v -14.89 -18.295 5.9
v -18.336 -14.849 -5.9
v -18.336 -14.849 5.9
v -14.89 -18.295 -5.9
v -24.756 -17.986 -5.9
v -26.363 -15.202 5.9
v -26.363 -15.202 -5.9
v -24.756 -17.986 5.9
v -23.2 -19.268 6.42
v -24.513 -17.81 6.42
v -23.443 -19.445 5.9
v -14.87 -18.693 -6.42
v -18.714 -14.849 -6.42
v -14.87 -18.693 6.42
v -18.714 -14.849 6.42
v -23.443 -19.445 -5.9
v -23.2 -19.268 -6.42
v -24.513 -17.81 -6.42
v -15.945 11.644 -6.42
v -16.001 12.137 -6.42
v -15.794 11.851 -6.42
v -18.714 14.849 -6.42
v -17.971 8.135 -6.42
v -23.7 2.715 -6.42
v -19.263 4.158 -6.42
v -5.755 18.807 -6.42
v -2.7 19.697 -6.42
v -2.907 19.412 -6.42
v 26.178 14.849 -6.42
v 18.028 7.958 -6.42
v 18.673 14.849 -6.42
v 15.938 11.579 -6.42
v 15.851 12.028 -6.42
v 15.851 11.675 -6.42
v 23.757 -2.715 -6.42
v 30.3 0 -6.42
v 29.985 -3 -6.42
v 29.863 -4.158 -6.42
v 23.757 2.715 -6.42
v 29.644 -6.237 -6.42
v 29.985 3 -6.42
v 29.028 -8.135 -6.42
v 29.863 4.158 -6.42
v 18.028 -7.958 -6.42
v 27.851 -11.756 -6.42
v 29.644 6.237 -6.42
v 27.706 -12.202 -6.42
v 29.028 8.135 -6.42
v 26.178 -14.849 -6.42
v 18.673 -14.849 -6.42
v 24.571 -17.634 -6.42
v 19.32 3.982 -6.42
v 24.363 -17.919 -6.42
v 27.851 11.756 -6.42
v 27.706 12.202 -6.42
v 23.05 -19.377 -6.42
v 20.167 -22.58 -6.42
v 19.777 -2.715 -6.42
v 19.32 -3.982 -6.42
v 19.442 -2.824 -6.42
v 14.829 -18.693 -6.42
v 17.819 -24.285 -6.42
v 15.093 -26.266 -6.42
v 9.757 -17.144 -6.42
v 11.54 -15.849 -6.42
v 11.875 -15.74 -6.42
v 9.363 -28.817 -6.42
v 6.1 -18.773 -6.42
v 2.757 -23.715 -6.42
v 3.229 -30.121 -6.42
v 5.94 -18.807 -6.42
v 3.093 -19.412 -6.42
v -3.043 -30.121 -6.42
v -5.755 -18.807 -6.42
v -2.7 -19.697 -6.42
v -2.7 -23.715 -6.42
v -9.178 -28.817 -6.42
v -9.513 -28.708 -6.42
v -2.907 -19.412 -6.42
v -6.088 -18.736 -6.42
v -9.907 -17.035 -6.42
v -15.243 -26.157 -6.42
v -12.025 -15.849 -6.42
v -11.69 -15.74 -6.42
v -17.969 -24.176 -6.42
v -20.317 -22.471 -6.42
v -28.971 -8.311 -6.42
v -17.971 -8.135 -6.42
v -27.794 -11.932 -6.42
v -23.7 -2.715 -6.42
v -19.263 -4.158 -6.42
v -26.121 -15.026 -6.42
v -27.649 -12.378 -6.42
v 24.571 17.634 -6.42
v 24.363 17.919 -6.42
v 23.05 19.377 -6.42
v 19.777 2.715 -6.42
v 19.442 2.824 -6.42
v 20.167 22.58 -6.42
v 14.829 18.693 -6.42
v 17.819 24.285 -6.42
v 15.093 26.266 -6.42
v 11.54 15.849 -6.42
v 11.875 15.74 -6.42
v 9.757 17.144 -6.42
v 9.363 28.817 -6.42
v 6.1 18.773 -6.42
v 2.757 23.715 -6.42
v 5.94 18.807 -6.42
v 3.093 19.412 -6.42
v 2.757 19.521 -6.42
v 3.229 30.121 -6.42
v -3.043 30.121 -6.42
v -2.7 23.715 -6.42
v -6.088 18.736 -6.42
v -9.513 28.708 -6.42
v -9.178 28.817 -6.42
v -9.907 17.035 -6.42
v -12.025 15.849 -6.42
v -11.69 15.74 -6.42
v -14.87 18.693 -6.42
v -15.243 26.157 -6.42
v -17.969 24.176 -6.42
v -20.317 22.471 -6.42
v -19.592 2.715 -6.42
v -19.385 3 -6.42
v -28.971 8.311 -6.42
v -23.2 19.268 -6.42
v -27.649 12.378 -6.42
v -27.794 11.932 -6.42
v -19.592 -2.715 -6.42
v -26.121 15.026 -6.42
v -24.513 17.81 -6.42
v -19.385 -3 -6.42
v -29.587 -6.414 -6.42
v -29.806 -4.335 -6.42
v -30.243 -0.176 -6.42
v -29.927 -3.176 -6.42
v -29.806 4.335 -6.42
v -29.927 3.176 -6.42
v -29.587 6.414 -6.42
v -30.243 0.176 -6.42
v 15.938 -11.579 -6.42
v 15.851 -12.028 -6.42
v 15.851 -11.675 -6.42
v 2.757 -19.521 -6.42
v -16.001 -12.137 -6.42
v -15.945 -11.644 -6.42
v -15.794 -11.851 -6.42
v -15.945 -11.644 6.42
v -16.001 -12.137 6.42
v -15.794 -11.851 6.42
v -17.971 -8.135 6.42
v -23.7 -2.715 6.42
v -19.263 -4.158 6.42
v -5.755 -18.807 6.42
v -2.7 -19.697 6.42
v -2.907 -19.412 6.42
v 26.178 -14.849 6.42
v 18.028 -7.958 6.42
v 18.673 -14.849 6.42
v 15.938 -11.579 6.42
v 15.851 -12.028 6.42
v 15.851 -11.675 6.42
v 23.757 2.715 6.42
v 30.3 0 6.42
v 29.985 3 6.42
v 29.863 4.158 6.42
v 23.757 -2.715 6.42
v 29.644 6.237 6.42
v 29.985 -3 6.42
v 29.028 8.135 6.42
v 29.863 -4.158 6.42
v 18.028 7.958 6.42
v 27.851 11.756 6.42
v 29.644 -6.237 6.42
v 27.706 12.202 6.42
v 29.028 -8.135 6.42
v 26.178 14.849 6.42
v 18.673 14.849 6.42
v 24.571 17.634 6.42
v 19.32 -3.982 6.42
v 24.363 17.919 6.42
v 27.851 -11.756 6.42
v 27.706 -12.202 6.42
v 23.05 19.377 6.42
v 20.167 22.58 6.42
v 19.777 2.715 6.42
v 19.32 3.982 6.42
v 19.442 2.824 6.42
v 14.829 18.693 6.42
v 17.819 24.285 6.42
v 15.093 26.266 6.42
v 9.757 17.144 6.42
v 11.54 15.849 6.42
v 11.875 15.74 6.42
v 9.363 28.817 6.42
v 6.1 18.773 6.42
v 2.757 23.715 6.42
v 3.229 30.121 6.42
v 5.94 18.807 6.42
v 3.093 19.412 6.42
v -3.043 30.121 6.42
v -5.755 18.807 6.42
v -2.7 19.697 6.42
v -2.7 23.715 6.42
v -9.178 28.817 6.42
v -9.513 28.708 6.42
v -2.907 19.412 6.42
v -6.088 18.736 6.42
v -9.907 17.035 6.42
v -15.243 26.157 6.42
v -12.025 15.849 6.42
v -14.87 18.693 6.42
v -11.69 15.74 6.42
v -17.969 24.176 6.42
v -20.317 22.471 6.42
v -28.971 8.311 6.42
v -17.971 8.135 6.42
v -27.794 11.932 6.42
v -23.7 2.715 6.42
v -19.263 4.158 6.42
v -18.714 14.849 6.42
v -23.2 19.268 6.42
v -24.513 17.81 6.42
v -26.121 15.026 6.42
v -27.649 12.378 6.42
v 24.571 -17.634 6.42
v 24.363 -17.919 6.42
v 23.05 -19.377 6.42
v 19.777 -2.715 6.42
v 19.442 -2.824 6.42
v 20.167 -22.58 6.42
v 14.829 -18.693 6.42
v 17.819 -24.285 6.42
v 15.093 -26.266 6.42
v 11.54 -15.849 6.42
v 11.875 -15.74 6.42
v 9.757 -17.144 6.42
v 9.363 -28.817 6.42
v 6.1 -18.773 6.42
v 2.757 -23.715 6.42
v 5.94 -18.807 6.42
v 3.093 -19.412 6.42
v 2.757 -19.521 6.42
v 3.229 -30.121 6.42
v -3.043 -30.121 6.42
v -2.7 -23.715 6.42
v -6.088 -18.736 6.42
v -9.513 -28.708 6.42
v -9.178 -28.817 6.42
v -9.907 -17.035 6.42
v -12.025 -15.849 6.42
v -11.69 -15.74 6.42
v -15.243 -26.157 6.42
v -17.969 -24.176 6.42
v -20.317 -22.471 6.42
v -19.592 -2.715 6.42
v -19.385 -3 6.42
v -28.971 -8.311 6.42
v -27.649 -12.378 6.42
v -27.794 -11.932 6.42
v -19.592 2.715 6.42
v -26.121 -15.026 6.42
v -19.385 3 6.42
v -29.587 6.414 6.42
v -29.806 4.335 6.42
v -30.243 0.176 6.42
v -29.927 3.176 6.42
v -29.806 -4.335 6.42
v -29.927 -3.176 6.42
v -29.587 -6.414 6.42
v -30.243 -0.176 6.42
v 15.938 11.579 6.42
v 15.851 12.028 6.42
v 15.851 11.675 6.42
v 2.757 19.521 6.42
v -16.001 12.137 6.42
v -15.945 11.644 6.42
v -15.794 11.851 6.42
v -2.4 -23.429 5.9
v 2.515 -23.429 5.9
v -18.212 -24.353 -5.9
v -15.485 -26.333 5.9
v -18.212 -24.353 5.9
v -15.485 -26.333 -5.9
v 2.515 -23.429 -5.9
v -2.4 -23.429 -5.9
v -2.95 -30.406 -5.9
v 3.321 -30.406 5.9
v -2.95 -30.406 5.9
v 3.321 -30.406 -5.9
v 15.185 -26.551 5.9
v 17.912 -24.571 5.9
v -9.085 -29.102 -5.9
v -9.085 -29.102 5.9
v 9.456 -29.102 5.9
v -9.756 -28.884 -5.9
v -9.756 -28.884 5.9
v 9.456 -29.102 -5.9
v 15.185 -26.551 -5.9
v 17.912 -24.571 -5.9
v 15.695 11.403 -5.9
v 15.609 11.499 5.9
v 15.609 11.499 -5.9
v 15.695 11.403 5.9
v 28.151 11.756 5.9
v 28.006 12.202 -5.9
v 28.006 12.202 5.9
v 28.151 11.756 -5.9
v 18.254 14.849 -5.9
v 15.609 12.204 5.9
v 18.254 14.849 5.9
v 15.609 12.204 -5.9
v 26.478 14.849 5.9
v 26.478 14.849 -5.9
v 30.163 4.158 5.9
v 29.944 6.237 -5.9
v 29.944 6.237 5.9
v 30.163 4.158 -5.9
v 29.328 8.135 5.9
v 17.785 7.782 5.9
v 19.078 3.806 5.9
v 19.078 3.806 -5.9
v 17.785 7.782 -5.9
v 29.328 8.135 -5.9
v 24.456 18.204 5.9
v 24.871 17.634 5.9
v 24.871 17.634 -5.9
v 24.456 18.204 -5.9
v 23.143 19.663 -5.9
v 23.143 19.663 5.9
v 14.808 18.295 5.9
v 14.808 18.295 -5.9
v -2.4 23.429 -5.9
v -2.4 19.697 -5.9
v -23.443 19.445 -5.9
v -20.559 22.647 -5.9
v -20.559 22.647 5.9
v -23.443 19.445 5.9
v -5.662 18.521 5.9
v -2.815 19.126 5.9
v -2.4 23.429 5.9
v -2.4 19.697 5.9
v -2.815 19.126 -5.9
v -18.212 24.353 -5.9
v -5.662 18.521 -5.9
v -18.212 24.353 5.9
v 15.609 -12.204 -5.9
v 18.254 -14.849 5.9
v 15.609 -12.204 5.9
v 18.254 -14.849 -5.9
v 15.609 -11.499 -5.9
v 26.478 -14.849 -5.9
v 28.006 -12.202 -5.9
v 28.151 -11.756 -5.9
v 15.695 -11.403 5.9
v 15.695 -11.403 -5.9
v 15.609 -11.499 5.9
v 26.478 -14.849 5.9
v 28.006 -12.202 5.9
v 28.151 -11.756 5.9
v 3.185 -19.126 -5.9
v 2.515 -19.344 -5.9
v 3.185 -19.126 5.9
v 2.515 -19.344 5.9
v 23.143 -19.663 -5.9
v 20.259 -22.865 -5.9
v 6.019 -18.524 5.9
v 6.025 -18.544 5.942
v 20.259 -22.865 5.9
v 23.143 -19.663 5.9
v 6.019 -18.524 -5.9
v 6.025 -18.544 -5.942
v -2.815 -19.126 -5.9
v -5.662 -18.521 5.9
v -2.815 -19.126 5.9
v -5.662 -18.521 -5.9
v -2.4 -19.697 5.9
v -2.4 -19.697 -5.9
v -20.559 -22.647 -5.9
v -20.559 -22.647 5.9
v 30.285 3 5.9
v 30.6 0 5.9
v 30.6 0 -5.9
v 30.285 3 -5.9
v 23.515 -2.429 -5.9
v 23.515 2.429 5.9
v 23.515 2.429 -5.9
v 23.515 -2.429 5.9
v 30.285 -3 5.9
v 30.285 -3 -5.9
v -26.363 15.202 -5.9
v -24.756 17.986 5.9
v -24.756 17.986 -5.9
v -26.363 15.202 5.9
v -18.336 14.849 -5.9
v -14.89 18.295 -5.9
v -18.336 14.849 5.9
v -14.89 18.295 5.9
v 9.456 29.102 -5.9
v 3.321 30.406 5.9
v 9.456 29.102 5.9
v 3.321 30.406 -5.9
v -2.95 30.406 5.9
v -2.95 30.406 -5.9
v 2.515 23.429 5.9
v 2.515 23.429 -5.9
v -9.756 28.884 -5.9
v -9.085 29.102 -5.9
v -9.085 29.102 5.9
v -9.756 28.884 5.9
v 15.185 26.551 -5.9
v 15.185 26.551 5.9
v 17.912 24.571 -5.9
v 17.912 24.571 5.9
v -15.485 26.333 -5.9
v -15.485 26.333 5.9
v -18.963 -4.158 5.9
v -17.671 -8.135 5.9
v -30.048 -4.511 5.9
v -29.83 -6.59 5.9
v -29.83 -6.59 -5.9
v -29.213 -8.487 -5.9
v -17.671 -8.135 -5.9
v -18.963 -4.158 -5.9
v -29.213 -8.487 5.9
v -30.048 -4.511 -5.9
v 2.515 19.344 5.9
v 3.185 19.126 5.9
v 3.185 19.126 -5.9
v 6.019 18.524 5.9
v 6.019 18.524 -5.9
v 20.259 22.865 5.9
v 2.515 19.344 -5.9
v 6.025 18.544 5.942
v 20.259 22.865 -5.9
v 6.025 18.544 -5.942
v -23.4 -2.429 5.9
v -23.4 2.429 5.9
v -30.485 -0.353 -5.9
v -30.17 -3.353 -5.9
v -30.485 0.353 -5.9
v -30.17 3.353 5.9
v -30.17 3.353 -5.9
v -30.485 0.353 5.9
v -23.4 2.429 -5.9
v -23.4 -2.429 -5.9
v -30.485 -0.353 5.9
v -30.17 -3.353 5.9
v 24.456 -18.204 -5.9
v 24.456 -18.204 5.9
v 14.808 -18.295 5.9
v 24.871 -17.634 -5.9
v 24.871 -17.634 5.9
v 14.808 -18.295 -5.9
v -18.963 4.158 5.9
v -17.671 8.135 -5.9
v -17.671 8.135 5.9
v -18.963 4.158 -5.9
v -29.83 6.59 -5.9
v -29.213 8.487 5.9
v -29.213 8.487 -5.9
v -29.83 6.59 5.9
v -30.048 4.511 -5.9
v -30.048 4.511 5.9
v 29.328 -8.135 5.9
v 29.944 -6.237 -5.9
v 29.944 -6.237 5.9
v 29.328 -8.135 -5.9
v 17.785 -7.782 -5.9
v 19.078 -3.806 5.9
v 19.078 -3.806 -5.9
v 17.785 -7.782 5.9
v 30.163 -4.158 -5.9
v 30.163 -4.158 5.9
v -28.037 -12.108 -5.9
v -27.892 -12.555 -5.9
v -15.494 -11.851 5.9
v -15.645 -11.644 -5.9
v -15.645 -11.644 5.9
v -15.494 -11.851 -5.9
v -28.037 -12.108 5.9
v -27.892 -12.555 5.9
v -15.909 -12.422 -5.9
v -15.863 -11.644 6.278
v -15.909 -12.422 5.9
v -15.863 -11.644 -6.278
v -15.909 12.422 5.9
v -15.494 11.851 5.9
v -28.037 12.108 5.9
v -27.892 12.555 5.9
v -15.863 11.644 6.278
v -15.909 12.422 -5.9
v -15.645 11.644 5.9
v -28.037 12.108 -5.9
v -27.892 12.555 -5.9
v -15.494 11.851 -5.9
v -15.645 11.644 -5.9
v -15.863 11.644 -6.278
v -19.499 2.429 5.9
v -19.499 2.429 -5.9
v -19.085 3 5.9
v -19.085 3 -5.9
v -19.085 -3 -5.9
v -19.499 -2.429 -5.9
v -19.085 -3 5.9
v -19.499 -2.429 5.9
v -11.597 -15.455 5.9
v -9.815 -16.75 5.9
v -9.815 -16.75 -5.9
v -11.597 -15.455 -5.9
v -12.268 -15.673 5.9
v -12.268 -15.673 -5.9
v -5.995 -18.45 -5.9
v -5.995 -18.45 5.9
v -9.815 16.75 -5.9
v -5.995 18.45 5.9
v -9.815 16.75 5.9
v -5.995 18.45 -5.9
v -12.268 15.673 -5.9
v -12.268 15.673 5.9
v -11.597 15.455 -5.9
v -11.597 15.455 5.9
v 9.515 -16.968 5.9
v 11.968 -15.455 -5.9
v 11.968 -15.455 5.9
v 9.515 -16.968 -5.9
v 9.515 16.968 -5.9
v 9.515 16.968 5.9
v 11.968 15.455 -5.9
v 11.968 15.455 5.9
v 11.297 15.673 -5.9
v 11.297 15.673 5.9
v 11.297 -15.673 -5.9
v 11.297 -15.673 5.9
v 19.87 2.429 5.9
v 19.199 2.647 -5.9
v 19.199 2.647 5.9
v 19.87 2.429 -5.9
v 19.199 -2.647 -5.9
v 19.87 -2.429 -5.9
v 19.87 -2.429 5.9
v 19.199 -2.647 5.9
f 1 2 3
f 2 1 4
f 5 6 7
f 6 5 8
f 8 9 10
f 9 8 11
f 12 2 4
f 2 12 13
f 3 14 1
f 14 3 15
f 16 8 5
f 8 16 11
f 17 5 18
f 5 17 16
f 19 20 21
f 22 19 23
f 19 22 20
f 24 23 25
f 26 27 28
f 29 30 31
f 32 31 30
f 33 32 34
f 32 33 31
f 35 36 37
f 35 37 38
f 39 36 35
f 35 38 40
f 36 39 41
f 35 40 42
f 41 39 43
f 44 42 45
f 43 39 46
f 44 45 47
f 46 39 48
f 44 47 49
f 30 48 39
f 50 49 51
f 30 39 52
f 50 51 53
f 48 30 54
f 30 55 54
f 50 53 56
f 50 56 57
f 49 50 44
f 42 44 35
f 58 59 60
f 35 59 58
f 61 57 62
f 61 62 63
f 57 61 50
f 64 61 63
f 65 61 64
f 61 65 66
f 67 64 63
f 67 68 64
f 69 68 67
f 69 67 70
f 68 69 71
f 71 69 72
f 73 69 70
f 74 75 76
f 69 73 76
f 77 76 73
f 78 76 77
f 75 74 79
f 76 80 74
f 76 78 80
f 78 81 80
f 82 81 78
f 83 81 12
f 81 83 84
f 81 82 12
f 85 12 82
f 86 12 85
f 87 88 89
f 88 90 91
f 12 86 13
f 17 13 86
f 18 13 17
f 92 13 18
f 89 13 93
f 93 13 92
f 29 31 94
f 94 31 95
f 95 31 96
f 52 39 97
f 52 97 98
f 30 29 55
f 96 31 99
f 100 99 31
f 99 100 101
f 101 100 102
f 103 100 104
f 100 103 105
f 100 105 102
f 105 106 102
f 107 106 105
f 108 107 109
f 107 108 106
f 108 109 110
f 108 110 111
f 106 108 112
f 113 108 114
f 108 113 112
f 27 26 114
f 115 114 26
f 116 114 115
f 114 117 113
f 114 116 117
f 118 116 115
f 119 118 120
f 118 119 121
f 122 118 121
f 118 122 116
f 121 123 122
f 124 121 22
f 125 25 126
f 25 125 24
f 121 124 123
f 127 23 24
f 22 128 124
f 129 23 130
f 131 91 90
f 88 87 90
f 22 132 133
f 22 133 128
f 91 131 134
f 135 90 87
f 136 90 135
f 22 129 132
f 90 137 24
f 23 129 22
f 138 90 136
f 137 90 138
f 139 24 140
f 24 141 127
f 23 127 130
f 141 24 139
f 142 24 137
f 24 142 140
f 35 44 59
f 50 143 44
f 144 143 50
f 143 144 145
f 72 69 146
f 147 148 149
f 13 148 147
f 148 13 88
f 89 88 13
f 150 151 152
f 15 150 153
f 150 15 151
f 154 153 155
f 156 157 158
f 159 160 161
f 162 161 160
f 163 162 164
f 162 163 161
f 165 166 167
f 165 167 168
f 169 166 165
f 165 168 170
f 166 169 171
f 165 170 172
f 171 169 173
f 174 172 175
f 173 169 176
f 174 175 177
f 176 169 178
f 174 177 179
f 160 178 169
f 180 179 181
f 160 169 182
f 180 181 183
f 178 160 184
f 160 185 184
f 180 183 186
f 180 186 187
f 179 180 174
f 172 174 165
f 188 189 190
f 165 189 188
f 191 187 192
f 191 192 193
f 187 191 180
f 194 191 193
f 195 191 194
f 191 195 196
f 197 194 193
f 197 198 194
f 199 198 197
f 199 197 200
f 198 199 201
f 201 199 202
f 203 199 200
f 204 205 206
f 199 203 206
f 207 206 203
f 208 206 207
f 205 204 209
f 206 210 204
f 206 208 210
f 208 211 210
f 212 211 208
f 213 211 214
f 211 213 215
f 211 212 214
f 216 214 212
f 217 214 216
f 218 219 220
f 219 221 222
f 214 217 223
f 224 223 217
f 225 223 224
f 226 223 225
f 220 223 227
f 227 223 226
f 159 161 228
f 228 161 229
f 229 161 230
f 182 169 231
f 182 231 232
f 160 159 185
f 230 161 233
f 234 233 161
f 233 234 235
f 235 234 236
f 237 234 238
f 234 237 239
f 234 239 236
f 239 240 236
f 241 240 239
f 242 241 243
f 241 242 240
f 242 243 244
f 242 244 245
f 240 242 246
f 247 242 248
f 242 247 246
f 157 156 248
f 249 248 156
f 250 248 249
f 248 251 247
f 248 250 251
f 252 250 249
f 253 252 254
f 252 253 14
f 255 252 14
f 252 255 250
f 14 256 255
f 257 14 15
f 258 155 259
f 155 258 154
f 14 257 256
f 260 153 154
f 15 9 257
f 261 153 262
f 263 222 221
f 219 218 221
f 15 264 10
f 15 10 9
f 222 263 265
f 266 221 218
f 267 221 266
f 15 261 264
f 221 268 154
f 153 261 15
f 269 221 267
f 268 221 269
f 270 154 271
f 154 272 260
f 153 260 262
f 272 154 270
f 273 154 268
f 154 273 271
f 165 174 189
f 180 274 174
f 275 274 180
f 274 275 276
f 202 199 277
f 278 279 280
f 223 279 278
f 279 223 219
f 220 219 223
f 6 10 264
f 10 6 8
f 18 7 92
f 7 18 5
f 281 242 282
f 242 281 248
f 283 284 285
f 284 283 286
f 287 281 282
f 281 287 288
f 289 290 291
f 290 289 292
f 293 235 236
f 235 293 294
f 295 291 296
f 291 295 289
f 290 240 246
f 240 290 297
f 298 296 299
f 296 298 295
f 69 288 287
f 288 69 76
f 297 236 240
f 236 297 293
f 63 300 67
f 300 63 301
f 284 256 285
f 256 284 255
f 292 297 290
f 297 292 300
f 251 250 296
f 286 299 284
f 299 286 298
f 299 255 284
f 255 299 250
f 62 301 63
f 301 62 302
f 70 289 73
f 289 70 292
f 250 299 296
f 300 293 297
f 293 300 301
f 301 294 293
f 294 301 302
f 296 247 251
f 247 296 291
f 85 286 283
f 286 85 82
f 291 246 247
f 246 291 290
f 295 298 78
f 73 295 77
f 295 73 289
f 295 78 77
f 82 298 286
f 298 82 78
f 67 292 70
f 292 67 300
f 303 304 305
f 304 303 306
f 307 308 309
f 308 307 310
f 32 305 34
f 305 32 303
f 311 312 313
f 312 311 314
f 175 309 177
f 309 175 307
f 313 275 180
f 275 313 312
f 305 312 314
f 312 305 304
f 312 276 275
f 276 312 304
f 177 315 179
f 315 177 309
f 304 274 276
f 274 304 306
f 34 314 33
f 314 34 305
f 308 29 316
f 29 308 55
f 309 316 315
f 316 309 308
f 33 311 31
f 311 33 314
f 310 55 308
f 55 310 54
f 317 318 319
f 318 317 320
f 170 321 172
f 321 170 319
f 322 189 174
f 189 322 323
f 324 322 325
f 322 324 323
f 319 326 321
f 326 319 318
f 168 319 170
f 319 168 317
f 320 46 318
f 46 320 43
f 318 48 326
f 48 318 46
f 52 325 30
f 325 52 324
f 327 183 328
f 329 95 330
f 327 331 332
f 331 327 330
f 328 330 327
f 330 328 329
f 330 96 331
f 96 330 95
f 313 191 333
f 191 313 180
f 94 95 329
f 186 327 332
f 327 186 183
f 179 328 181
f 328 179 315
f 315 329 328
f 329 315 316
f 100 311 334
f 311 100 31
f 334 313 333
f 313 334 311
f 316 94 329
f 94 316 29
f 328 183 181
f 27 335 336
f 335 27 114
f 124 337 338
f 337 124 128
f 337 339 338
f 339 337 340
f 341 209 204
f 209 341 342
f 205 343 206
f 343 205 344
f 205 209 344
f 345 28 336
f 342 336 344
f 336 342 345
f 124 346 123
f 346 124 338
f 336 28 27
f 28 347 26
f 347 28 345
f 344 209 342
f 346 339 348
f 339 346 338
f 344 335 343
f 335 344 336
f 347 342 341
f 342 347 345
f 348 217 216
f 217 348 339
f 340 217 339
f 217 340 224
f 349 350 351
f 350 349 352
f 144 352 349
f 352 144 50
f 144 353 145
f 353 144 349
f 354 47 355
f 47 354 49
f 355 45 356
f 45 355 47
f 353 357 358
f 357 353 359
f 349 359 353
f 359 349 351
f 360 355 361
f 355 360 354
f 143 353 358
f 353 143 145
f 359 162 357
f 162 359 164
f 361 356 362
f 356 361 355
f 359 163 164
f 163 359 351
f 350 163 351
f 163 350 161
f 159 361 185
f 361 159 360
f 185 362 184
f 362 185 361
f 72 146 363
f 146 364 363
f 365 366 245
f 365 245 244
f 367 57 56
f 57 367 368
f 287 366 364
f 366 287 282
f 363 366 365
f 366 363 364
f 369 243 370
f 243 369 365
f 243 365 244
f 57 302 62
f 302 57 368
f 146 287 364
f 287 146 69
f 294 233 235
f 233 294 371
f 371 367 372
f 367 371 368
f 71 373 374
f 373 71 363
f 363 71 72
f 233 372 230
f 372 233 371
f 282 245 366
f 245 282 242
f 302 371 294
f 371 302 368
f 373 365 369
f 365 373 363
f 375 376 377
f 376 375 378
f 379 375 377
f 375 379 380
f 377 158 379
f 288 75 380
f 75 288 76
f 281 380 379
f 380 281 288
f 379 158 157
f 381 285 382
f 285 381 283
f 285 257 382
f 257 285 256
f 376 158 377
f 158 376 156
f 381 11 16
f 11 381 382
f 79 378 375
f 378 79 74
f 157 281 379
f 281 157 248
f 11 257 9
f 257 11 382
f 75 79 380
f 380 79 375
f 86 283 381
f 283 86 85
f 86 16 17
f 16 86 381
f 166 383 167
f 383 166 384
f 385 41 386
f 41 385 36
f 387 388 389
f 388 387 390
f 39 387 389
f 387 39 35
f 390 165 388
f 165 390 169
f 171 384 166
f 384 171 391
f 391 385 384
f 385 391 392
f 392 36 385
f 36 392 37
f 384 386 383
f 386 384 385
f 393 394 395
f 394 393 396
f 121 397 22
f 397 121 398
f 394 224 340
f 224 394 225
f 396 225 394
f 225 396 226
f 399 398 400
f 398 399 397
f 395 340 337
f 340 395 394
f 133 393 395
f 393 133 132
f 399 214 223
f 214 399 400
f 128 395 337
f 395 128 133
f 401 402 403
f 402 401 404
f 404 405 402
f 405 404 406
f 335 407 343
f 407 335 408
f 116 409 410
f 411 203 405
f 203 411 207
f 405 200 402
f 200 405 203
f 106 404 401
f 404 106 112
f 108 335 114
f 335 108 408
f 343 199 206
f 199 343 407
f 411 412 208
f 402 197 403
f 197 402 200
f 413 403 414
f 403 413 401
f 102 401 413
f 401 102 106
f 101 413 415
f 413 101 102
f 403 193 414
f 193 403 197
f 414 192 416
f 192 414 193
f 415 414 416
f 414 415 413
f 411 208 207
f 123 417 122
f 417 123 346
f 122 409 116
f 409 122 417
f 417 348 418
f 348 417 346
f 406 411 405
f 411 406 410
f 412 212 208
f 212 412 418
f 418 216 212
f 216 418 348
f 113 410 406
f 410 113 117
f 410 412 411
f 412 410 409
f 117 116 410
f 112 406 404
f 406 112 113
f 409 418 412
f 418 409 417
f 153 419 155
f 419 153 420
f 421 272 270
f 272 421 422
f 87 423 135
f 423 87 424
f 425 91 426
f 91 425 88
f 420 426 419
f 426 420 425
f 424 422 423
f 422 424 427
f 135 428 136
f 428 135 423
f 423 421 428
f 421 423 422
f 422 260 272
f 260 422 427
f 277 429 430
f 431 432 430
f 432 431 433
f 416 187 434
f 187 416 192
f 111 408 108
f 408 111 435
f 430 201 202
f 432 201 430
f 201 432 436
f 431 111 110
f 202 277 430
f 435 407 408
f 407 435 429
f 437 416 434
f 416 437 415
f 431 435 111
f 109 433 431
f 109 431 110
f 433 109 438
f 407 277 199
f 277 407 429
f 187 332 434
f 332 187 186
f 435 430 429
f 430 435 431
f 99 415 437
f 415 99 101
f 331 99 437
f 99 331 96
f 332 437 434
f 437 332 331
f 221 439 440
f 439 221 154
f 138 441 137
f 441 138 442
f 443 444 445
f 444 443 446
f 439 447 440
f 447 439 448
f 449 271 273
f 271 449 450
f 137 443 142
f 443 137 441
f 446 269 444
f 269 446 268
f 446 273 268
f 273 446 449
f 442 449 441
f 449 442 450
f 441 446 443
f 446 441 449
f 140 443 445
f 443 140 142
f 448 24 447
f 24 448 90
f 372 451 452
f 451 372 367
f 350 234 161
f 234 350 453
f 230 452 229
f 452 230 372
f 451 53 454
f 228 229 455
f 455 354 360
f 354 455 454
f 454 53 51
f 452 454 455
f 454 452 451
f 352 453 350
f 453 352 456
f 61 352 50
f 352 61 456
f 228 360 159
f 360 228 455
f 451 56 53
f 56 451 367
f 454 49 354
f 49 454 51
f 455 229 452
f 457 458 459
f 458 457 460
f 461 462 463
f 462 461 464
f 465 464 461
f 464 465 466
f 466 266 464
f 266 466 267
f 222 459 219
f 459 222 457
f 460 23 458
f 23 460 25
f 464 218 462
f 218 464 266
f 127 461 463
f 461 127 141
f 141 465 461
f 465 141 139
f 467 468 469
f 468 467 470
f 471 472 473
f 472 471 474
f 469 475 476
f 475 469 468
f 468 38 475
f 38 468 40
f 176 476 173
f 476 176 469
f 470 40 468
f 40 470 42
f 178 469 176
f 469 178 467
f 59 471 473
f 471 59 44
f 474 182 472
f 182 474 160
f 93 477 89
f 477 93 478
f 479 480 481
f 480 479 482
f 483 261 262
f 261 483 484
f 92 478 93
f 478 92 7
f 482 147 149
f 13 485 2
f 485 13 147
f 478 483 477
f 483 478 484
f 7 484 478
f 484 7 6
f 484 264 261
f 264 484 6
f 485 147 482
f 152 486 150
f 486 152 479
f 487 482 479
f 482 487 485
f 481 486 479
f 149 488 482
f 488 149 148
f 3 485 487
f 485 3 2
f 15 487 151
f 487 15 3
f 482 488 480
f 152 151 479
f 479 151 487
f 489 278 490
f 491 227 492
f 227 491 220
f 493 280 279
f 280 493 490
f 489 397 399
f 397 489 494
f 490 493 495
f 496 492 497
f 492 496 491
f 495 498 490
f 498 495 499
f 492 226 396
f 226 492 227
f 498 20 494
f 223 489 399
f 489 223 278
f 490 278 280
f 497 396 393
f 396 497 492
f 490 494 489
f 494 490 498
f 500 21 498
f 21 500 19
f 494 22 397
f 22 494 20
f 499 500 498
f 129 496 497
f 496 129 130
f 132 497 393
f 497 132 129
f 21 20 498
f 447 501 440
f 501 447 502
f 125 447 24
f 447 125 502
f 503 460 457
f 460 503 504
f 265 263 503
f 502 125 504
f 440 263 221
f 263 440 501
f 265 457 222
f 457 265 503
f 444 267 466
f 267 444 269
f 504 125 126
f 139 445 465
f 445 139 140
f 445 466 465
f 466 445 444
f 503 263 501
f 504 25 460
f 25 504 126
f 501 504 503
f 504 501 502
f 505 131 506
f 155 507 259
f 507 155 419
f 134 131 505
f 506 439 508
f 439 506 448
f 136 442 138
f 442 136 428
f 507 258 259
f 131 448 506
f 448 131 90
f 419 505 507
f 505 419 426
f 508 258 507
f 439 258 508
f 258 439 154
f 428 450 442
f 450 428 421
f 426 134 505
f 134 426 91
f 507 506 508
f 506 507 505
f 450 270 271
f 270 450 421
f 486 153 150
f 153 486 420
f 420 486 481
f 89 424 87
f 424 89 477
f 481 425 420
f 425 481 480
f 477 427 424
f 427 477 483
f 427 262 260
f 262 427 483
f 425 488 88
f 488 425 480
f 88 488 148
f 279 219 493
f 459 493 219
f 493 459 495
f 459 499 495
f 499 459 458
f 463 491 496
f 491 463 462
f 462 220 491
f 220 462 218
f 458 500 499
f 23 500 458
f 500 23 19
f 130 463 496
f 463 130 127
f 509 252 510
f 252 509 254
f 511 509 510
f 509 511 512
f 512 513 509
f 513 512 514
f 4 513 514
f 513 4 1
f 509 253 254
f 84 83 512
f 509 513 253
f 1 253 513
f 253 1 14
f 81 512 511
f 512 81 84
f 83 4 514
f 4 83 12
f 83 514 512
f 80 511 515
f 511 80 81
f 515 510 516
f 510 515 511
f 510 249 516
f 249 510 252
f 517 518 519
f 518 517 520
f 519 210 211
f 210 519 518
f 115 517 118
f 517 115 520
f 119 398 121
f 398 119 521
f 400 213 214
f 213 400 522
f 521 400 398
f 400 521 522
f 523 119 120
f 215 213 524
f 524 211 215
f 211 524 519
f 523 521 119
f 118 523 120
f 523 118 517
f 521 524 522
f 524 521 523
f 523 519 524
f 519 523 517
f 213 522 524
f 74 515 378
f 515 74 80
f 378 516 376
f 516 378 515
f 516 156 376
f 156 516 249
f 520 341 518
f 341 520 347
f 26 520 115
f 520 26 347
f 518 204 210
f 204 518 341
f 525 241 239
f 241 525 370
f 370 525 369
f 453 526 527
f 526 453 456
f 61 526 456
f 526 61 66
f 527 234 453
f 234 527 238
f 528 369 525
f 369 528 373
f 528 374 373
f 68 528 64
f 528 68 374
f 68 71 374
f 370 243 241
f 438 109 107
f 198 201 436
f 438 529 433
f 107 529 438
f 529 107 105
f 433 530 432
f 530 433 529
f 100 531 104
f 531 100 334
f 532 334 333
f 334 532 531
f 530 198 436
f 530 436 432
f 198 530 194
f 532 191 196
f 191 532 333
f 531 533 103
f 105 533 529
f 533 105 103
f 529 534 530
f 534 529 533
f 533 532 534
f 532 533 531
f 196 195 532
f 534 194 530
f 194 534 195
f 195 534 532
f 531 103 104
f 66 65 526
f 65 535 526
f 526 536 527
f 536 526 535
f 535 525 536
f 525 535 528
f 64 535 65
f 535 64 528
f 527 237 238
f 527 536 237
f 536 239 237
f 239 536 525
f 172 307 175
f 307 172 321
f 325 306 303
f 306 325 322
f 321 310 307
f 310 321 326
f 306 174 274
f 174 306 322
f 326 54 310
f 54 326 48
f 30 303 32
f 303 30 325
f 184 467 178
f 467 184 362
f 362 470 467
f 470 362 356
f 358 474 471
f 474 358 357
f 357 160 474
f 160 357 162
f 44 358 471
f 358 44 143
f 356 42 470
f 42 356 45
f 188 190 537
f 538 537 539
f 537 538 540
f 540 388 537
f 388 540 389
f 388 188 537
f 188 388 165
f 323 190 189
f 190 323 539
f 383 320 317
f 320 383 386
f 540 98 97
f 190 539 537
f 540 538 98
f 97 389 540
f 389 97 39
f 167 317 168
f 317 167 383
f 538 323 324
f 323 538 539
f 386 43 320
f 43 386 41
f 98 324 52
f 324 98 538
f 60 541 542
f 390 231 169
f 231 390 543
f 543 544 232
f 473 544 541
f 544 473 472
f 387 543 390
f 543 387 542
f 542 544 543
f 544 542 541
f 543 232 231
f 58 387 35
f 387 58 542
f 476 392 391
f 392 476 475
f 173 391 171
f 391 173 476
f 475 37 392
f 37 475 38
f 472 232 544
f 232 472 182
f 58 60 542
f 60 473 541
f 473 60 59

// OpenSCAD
// Parameters
bbox_X = 60.0; //[30.0:120.0:0.01]
bbox_Y = 59.56; //[29.78:119.12:0.01]
thickness_Z = 11.8; //[5.9:23.6:0.01]
outer_Rx = 30.0; //[15.0:60.0:0.01]
outer_Ry = 29.78; //[14.89:59.56:0.01]
bore_d = 40.0; //[20.0:80.0:0.01]
notch_count = 8; //[2:24:1]
notch_width_tangential = 6.0; //[3.0:12.0:0.01]
notch_depth_radial = 4.0; //[2.0:8.0:0.01]
notch_overlap = 1.0; //[0.5:2.0:0.01]
outer_scale_x = 1.0; //[0.8:1.2:0.0001]
outer_scale_y = 1.0; //[0.8:1.2:0.0001]
edge_chamfer = 0.8; //[0.0:2.0:0.01]
edge_fillet = 0.6; //[0.0:2.0:0.01]
engrave_depth = 0.4; //[0.0:1.5:0.01]

// Base Shapes
module outer_annulus_body_raw() {
  cylinder(r=outer_Rx, h=thickness_Z, center=true);
}

module central_through_bore() {
  cylinder(r=bore_d/2, h=thickness_Z + 2*notch_overlap, center=true);
}

module notch_cutter_base() {
  translate([bore_d/2 + (notch_depth_radial + notch_overlap)/2 - notch_overlap, 0, 0])
    cube([notch_depth_radial + notch_overlap, notch_width_tangential, thickness_Z + 2*notch_overlap], center=true);
}

module edge_round_sphere() {
  sphere(r=edge_fillet, center=true);
}

// Operations
module outer_profile_xy_scaling_to_match_60_00x59_56() {
  scale([outer_scale_x*(bbox_X/(2*outer_Rx)), outer_scale_y*(bbox_Y/(2*outer_Ry)), 1])
    outer_annulus_body_raw();
}

module outer_annulus_body() {
  difference() {
    outer_profile_xy_scaling_to_match_60_00x59_56();
    central_through_bore();
  }
}

module inner_circumference_rectangular_notches() {
  union() {
    for (i = [0:notch_count-1]) {
      rotate([0, 0, i*(360/notch_count)])
        notch_cutter_base();
    }
  }
}

module even_angular_patterning_of_notches() {
  difference() {
    outer_annulus_body();
    inner_circumference_rectangular_notches();
  }
}

module edge_fillets() {
  minkowski() {
    even_angular_patterning_of_notches();
    edge_round_sphere();
  }
}

module edge_chamfers() {
  union() {
    edge_fillets();
  }
}

// Final Output
edge_chamfers();
